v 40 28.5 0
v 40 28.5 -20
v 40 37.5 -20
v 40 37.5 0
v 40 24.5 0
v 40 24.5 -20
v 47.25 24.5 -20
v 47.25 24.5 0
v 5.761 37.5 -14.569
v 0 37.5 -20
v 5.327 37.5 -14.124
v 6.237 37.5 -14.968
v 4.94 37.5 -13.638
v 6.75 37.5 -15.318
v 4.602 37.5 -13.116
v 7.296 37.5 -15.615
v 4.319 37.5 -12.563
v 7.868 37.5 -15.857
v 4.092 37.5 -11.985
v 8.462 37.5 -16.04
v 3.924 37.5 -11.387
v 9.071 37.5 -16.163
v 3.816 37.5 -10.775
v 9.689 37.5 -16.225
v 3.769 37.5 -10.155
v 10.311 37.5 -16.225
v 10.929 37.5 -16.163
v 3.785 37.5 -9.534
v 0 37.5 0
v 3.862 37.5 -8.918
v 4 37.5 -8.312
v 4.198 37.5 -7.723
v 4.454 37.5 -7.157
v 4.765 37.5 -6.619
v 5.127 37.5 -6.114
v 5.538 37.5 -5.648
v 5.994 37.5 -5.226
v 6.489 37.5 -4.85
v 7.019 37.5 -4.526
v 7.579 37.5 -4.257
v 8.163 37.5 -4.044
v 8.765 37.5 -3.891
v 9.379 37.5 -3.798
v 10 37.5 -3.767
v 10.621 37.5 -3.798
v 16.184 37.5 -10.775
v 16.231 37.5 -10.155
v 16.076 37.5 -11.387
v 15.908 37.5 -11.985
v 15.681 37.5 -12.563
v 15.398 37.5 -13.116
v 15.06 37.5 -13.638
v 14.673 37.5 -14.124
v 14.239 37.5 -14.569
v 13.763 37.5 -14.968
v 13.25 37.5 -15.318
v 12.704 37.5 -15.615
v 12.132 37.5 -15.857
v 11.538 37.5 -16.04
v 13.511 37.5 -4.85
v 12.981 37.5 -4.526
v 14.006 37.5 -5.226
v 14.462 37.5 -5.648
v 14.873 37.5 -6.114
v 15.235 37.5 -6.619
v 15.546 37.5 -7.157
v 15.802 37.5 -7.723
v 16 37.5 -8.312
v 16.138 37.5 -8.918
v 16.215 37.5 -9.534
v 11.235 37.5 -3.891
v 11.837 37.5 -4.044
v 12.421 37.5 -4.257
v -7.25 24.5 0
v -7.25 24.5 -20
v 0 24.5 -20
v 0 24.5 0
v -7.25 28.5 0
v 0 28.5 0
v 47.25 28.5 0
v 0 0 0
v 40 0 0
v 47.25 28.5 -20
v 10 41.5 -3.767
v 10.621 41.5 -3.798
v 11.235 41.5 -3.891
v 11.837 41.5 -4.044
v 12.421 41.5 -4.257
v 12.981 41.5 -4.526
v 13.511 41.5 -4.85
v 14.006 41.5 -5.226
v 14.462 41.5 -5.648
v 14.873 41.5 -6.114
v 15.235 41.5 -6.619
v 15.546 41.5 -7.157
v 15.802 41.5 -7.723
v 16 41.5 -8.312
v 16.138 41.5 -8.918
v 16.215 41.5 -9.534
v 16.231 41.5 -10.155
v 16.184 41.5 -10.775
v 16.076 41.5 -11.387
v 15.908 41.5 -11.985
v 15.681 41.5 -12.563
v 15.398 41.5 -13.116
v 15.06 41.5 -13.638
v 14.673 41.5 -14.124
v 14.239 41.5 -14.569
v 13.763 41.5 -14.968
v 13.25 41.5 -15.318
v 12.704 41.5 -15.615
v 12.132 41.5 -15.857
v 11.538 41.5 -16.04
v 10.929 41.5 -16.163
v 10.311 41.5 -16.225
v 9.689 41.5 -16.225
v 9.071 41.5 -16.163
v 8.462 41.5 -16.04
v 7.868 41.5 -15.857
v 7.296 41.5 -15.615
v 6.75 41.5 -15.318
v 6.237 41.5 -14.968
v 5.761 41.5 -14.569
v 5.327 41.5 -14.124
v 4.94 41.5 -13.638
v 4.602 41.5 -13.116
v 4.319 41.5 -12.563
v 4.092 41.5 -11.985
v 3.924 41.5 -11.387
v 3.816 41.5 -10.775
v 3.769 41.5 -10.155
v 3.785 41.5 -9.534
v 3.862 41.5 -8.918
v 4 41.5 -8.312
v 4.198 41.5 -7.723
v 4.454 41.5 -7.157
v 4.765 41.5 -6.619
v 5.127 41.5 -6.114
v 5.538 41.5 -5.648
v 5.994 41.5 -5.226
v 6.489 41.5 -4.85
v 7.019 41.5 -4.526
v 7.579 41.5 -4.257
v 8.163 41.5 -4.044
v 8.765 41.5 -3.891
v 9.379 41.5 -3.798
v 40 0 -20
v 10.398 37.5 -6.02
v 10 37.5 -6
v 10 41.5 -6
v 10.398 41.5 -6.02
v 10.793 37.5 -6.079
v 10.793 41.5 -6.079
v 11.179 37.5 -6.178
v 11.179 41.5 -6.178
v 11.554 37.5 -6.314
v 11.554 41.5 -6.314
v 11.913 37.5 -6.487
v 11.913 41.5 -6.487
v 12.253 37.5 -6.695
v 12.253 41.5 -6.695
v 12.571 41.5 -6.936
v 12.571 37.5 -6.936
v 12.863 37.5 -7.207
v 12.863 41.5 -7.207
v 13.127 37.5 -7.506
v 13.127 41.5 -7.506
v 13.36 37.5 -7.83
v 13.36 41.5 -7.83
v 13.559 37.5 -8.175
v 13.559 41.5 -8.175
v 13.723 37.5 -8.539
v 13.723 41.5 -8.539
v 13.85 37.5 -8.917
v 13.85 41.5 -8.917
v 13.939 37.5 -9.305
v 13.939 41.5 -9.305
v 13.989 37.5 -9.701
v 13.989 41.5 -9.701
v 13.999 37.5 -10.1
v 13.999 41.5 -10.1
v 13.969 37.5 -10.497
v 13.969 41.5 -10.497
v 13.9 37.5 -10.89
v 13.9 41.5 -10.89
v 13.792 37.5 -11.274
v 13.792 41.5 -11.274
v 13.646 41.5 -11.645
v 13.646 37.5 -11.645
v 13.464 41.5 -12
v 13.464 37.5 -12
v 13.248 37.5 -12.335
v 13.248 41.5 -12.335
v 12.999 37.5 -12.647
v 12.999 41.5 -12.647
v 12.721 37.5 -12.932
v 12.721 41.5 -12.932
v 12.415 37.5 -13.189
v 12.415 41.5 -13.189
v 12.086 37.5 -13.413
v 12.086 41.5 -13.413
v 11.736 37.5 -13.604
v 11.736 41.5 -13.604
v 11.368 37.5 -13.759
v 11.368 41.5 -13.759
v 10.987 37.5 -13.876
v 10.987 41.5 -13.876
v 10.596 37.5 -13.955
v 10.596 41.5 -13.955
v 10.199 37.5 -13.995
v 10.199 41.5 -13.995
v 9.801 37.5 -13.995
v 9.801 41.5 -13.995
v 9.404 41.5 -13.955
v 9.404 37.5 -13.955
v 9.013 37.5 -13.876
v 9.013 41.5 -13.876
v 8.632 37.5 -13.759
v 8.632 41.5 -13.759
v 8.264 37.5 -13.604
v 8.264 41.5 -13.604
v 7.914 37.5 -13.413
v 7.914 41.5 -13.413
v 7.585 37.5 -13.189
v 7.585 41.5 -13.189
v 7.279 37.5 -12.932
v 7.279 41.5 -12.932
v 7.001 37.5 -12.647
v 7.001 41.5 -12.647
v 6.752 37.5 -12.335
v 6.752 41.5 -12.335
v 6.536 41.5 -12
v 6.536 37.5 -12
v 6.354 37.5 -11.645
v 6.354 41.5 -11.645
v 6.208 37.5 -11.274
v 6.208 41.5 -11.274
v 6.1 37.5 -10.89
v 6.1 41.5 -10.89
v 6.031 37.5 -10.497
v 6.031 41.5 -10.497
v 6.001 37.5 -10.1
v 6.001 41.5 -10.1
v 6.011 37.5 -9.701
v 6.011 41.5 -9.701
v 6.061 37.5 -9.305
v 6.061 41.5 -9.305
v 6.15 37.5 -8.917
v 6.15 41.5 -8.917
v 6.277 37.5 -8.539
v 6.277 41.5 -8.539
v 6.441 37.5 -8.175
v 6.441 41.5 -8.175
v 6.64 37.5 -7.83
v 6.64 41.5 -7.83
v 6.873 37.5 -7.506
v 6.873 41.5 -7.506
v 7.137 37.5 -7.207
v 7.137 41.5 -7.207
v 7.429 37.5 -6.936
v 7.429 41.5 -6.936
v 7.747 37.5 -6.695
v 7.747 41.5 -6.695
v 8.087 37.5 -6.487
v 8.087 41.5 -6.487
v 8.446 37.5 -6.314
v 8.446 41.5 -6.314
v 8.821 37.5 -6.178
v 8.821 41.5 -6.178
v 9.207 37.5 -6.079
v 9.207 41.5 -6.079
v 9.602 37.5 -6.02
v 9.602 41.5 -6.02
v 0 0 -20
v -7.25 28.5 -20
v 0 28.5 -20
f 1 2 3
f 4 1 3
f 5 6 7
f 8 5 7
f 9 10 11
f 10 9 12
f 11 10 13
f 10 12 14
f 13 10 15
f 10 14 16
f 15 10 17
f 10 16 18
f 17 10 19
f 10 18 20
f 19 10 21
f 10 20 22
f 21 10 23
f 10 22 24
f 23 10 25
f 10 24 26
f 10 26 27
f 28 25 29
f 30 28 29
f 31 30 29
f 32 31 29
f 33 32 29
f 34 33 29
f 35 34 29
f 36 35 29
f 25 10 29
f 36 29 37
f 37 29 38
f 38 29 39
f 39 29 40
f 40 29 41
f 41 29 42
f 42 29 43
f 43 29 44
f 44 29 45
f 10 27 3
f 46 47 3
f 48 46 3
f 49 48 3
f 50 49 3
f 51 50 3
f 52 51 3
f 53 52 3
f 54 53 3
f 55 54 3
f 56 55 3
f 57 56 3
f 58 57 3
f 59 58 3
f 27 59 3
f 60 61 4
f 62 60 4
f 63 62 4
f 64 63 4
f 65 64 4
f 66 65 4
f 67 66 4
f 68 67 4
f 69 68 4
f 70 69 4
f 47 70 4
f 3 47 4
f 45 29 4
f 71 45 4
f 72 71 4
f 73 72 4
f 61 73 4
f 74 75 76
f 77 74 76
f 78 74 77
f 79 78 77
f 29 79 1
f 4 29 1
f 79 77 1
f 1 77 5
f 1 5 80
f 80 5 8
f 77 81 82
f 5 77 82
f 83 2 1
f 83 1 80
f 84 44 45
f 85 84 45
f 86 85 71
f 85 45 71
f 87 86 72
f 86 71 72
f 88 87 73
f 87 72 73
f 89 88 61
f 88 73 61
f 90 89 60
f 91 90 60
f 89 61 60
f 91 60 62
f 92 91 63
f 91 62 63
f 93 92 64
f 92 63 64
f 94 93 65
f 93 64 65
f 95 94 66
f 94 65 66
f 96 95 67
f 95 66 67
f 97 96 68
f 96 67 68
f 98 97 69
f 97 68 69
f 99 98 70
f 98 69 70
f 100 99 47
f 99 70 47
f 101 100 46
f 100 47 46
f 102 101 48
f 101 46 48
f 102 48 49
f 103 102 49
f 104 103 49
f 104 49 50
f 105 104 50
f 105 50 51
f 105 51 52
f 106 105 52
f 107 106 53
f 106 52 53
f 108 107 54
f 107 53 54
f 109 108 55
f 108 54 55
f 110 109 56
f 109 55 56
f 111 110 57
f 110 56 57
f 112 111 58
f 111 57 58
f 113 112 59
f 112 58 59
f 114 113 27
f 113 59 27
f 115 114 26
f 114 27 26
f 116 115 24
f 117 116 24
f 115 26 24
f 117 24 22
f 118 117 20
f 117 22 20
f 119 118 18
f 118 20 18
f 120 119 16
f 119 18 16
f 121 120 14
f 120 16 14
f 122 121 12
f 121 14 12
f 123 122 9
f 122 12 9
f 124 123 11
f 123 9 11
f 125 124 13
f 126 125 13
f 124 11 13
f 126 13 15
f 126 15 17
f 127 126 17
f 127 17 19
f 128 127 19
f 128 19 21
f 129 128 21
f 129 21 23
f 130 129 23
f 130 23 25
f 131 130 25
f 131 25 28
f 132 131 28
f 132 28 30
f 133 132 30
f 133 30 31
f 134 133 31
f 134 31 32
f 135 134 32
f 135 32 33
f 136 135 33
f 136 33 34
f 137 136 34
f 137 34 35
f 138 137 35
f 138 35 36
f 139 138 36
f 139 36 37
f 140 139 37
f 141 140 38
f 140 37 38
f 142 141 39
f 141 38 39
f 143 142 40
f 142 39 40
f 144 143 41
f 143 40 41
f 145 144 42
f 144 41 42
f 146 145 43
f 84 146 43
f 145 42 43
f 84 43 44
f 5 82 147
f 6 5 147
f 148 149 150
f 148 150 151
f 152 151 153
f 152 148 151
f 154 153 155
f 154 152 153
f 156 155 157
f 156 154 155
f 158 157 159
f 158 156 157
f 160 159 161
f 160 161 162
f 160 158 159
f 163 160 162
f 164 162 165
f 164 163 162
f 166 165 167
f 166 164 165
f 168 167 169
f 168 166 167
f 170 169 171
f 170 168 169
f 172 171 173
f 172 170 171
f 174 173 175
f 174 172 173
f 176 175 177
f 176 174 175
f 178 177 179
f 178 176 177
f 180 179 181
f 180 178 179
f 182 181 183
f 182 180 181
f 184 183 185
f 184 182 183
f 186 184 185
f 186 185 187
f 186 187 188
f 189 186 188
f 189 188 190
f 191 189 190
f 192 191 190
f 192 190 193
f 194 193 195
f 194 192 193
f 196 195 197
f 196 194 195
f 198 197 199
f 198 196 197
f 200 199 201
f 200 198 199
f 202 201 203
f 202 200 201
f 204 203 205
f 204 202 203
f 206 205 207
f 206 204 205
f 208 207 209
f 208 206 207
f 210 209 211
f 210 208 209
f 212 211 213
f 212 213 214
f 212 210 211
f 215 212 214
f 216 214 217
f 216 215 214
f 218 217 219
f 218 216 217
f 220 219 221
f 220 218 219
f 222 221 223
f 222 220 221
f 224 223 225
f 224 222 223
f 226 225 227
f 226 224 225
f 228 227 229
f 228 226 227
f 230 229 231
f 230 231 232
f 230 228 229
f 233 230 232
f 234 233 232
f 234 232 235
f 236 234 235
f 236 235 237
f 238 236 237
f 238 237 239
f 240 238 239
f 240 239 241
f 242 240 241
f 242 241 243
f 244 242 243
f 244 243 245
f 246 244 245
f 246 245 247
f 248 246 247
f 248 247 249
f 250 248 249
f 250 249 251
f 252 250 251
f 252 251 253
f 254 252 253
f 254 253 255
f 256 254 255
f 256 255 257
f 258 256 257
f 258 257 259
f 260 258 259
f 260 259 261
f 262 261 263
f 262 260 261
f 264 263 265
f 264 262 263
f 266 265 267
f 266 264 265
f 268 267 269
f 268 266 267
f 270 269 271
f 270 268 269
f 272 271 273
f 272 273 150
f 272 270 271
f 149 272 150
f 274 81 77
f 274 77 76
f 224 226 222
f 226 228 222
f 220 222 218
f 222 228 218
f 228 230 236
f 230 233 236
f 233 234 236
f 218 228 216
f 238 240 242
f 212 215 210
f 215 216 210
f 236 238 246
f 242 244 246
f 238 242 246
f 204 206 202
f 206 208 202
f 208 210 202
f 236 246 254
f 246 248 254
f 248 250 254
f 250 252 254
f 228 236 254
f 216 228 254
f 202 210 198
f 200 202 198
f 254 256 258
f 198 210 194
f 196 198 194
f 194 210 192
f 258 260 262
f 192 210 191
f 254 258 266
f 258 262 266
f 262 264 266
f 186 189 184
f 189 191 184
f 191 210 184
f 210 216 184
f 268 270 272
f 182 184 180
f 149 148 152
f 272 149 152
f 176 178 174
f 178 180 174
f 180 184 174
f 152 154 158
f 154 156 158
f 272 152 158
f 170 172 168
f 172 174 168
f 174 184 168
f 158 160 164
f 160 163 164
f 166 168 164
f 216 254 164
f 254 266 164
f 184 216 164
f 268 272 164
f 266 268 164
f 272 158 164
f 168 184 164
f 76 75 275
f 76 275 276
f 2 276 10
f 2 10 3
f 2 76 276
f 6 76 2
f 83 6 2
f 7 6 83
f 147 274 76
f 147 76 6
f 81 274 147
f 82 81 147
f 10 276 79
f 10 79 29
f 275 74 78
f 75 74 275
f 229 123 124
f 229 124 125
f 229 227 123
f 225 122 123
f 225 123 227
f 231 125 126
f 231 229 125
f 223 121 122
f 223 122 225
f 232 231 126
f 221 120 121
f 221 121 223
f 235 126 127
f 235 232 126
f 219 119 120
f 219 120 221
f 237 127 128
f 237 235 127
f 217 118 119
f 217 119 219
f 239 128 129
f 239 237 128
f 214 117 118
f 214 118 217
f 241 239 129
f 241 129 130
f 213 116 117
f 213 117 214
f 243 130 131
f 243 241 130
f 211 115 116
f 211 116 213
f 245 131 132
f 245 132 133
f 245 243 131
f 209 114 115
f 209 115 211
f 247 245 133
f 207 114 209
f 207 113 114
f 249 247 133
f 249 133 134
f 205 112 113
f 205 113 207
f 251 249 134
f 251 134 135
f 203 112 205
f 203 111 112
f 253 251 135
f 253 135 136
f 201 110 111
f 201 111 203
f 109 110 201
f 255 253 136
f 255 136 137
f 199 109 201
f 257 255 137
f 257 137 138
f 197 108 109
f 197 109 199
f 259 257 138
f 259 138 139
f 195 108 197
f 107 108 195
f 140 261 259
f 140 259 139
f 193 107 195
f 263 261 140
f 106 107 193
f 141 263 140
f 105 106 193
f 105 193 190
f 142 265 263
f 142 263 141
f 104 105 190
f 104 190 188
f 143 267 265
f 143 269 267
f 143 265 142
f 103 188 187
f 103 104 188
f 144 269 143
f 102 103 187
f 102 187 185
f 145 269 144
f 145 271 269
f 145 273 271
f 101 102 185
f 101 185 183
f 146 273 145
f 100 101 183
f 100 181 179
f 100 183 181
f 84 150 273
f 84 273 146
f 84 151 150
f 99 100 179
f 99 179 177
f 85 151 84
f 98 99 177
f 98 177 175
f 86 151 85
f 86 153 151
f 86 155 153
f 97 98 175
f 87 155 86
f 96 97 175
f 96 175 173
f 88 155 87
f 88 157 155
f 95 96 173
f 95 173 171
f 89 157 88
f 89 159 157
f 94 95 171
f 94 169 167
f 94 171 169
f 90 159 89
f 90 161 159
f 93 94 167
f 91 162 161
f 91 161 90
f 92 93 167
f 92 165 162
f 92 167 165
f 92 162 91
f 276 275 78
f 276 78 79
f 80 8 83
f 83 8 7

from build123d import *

# Parameters (mm, degrees)
SKETCH1_W           = 40
SKETCH1_H           = 20
BOSS_EXTRUDE1_DEPTH = 24.5
SKETCH2_W           = 54.5
SKETCH2_H           = 20
BOSS_EXTRUDE2_DEPTH = 4
SKETCH3_W           = 40
SKETCH3_H           = 37.5
BOSS_EXTRUDE3_DEPTH = 20
SKETCH8_R           = 6.232527985
SKETCH8_R_2         = 4
BOSS_EXTRUDE4_DEPTH = 4


with BuildPart() as part:
    # Sketch1 → Boss-Extrude1 (new body)
    with BuildSketch(Plane(origin=(0, 0, 0), x_dir=(1, 0, 0), z_dir=(0, 1, 0))):
        with Locations((20, 10)):
            Rectangle(SKETCH1_W, SKETCH1_H)
    extrude(amount=BOSS_EXTRUDE1_DEPTH)

    # Sketch2 → Boss-Extrude2 (add)
    with BuildSketch(Plane(origin=(0, 24.5, 0), x_dir=(1, 0, 0), z_dir=(0, 1, 0))):
        with Locations((20, 10)):
            Rectangle(SKETCH2_W, SKETCH2_H)
    extrude(amount=BOSS_EXTRUDE2_DEPTH)

    # Sketch3 → Boss-Extrude3 (add)
    with BuildSketch(Plane.XY):
        with Locations((20, 18.75)):
            Rectangle(SKETCH3_W, SKETCH3_H)
    extrude(amount=-BOSS_EXTRUDE3_DEPTH)

    # Sketch8 → Boss-Extrude4 (add)
    with BuildSketch(Plane(origin=(0, 37.5, 0), x_dir=(1, 0, 0), z_dir=(0, 1, 0))):
        with Locations(Location((10, 10, 0), (0, 0, 270))):
            Circle(SKETCH8_R)
        with Locations(Location((10, 10, 0), (0, 0, 270))):
            Circle(SKETCH8_R_2, mode=Mode.SUBTRACT)
    extrude(amount=BOSS_EXTRUDE4_DEPTH)


solid = part.part
